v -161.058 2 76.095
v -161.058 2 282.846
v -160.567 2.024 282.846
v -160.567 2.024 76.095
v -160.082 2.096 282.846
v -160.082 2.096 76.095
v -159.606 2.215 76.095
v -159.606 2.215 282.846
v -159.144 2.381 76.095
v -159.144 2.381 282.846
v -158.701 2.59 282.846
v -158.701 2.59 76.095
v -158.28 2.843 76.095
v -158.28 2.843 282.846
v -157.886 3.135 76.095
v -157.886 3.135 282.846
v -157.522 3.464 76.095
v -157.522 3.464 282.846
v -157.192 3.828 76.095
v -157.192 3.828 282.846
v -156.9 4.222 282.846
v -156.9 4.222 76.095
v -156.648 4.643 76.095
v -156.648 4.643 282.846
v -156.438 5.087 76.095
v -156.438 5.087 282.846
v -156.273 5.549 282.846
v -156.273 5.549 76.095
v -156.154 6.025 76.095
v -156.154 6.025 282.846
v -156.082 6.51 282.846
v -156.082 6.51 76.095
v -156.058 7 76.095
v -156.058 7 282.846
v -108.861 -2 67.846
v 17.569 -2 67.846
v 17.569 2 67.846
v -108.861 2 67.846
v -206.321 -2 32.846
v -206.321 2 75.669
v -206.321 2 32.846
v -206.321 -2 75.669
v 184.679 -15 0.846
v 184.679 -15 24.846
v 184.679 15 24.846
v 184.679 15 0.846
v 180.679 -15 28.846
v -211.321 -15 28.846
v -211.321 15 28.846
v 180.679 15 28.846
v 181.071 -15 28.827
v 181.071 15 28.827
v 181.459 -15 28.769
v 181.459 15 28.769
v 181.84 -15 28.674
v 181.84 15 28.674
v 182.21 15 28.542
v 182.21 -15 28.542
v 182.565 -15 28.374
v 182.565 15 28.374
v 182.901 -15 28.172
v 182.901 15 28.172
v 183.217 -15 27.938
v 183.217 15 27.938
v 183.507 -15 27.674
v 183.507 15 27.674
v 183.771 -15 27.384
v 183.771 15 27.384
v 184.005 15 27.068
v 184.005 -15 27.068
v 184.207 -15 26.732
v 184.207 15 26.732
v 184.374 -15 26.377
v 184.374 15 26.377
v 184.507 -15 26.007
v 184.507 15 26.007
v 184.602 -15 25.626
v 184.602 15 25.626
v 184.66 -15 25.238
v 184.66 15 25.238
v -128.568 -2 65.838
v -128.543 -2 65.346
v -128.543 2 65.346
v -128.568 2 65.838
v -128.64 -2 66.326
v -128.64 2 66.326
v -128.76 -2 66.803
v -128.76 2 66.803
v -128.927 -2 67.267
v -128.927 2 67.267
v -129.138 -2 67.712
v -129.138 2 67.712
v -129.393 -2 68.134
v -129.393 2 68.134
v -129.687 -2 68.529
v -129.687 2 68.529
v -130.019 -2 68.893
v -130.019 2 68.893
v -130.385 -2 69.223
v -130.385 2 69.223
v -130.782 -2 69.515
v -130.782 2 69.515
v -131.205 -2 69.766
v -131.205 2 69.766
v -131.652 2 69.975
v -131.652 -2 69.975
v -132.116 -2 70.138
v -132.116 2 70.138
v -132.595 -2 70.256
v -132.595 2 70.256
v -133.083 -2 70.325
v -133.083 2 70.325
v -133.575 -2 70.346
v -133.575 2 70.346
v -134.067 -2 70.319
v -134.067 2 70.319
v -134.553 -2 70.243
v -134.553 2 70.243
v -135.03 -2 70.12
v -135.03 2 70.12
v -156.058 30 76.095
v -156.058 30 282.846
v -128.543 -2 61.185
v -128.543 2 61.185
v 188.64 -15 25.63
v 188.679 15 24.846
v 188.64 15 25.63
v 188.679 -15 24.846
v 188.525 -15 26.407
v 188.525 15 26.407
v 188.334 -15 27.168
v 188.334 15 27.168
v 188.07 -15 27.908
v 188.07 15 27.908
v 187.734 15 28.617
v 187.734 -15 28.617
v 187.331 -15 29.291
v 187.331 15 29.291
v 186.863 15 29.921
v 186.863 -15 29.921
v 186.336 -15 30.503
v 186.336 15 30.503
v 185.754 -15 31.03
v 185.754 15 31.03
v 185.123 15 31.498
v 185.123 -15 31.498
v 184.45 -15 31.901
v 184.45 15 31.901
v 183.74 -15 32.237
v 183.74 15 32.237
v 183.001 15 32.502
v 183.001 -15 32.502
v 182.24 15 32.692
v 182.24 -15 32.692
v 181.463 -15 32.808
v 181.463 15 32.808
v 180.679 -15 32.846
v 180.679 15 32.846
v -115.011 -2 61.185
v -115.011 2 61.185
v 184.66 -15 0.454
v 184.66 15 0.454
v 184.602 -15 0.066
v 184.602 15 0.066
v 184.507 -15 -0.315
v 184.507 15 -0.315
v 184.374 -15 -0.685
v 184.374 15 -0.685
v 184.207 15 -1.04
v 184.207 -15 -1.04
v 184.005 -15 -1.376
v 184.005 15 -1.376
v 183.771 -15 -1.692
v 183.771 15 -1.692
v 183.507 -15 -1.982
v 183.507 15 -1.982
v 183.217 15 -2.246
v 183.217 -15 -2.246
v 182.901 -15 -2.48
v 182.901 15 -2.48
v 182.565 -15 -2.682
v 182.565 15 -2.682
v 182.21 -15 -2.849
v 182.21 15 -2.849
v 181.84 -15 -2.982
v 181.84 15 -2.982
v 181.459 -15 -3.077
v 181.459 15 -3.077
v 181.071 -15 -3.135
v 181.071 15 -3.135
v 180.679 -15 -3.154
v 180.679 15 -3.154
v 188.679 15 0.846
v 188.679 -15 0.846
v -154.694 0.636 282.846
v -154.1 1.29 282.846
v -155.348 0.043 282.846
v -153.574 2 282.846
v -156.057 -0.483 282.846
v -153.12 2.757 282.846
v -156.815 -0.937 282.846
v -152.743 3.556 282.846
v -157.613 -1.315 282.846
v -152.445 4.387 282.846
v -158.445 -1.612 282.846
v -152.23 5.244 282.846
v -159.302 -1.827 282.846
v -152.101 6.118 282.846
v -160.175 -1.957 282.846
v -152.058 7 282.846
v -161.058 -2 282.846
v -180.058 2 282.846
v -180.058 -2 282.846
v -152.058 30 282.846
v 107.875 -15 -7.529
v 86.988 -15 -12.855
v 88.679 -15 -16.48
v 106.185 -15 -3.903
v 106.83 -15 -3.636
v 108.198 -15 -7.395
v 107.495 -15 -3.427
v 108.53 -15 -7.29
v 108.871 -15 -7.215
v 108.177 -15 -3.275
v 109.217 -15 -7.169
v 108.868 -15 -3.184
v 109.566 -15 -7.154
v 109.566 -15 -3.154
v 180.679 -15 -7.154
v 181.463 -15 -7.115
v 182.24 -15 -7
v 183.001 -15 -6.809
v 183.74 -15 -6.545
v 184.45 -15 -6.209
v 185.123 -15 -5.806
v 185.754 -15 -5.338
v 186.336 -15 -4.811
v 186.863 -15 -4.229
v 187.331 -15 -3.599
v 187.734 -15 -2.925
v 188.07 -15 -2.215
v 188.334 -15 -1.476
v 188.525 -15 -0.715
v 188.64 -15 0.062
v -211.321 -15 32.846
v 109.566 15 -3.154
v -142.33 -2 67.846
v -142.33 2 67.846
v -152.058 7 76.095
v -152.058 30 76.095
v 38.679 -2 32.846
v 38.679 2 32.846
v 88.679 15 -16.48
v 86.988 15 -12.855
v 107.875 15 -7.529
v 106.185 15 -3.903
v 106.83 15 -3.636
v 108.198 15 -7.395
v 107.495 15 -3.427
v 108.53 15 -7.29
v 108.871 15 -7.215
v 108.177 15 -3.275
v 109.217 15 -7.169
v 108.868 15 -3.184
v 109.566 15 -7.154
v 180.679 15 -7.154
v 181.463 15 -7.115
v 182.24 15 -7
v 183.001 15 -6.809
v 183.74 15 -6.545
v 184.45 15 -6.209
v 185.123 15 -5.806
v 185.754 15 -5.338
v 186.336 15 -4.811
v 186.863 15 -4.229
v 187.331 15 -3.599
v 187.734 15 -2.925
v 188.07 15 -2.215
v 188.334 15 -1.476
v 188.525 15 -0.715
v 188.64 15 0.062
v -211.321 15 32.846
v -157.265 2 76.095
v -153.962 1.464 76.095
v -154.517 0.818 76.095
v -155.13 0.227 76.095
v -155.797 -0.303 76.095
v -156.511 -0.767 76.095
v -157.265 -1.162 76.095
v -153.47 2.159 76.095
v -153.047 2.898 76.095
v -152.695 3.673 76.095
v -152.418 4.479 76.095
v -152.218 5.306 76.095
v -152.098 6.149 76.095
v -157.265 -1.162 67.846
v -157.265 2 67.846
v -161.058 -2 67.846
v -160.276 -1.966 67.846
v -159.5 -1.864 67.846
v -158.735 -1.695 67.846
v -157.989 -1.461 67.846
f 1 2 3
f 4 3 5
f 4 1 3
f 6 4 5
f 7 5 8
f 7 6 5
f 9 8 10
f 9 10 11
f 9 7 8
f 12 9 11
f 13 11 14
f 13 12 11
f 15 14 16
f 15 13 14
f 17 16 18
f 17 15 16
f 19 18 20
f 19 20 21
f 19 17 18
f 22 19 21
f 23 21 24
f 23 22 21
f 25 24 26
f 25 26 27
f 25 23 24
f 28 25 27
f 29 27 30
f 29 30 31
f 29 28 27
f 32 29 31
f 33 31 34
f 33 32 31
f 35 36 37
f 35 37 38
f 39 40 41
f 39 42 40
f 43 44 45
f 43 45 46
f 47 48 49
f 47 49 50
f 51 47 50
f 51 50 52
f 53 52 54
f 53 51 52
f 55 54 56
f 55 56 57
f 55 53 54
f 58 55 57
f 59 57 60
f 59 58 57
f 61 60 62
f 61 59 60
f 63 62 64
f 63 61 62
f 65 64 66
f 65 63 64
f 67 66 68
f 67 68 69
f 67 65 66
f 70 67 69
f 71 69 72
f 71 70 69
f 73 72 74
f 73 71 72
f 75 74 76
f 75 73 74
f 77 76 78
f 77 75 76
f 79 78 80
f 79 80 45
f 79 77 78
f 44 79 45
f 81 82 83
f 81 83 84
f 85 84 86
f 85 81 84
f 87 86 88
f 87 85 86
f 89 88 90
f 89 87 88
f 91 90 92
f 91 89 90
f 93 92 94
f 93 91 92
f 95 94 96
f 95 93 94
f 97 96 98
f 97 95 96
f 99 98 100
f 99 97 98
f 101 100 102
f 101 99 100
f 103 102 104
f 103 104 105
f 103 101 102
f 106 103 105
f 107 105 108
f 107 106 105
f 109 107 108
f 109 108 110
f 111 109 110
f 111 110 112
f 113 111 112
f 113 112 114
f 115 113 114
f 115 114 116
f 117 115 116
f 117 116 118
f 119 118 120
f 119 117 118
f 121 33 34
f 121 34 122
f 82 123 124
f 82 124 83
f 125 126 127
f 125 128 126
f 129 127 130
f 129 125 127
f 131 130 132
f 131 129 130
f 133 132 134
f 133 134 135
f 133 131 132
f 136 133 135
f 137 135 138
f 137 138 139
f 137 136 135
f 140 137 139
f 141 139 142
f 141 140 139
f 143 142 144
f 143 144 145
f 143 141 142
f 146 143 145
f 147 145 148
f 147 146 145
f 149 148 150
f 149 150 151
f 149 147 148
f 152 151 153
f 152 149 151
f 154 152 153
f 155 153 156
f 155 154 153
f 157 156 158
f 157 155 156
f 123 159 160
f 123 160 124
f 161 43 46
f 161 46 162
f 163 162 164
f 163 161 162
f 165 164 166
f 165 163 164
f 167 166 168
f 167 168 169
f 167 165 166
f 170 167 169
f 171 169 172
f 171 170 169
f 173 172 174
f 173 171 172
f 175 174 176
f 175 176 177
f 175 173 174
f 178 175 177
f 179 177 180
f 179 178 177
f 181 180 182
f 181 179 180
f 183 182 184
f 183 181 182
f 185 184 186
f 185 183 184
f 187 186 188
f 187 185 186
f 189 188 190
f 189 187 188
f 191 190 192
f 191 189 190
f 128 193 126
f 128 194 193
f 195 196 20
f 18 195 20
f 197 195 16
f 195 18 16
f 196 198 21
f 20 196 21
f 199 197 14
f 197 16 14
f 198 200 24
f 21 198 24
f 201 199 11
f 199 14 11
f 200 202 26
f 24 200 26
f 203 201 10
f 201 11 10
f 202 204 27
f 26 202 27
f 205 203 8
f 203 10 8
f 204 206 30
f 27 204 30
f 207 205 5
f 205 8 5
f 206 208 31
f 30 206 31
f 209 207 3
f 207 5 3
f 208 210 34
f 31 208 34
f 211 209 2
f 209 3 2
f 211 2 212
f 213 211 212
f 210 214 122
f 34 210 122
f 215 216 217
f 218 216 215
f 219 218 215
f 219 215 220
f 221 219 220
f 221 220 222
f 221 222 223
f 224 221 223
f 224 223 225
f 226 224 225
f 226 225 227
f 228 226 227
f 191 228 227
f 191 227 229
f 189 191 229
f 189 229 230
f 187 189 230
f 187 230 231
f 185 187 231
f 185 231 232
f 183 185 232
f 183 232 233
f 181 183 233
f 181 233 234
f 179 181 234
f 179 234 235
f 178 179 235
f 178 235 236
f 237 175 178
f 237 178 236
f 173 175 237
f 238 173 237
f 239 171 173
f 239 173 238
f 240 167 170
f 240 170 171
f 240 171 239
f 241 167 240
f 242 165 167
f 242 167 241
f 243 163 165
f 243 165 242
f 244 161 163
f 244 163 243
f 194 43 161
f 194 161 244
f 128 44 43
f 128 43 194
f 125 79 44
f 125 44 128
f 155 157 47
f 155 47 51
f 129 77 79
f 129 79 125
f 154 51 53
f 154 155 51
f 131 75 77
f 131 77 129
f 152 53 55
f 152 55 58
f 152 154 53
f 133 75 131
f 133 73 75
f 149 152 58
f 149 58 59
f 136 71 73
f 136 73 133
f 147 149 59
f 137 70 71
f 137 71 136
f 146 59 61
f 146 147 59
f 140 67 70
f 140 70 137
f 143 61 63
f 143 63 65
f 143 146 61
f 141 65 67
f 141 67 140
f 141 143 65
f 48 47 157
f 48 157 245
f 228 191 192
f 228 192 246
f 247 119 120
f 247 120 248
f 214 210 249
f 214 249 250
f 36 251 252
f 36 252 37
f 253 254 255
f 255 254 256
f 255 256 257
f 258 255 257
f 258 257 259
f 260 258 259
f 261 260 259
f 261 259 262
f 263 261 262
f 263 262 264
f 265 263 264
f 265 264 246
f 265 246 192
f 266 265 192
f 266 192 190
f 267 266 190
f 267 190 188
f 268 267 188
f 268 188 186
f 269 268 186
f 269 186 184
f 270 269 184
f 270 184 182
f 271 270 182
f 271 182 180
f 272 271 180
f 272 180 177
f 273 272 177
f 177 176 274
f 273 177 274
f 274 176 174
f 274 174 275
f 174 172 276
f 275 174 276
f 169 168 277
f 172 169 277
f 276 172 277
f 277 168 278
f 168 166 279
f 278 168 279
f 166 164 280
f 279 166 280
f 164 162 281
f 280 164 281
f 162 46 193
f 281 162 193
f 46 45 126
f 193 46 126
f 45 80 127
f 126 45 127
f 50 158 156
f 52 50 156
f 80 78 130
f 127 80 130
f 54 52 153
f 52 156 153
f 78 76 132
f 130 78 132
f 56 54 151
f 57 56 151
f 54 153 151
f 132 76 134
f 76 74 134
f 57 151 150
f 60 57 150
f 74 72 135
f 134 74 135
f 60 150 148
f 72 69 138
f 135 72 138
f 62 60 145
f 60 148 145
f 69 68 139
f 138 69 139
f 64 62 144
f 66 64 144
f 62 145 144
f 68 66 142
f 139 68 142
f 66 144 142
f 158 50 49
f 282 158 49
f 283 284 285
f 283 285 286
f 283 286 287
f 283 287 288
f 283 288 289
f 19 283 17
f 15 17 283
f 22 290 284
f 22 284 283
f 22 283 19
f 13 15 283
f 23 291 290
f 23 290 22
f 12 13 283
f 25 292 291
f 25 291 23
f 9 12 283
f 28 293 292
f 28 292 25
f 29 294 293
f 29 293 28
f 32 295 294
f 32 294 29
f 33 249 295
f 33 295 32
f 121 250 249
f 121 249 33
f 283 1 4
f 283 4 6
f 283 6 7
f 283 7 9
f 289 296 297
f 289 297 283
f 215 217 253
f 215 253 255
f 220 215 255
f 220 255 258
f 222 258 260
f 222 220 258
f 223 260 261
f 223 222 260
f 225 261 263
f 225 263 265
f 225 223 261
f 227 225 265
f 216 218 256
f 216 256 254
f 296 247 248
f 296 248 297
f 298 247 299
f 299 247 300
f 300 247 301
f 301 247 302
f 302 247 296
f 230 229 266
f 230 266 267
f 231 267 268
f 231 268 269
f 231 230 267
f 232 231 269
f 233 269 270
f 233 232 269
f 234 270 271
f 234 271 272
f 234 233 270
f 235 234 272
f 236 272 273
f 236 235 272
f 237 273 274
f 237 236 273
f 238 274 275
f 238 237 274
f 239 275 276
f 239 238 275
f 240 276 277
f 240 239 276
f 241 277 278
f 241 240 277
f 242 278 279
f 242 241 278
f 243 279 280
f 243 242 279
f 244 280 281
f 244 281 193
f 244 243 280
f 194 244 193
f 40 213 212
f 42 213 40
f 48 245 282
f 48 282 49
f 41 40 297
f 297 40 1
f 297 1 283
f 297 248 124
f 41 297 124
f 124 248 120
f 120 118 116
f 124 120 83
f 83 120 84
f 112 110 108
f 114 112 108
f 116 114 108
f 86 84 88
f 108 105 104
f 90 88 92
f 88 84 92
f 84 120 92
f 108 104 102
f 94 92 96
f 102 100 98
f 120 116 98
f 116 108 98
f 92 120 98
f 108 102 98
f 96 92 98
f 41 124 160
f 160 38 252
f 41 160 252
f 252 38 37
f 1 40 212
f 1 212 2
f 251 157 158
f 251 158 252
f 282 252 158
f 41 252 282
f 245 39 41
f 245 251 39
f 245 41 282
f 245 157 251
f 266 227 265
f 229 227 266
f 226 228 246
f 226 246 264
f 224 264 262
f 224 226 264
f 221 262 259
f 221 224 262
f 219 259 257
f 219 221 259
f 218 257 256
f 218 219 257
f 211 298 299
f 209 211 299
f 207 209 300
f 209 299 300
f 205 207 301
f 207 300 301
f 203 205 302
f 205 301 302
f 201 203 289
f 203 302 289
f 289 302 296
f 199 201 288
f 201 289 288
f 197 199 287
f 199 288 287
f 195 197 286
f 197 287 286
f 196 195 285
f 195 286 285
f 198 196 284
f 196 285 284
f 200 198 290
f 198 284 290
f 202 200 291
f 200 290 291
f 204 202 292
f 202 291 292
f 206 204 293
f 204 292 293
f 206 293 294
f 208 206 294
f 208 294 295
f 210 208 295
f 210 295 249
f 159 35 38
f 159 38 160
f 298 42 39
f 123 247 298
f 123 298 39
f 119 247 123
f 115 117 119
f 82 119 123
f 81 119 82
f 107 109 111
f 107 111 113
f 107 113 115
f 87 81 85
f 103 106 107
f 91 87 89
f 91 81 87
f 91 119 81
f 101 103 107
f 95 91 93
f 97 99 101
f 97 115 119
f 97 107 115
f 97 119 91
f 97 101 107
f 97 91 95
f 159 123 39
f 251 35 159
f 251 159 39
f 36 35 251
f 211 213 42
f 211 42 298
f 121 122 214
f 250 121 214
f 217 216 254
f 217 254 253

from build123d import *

# Parameters (mm, degrees)
F1_DEPTH    = 15
F3_DEPTH    = 2
F4_W        = 4
F4_H        = 28
F5_DEPTH    = 206.7509774754
F6_T1_DEPTH = 206.7509774754
F7_T4_DEPTH = 251.7509774754


# Not quite as in the source:
# - a fillet or chamfer that OpenCascade refuses, or shapes differently, is made with other operations: its cross-section is extruded or revolved along the edge and cut away or added


with BuildPart() as f1:
    # F0 (on Front) → F1 (new body, symmetric)
    with BuildSketch(Plane.XZ):
        with BuildLine():
            Line((180.6789295077, 32.8460444401), (-211.3210704923, 32.8460444401))
            Line((-211.3210704923, 32.8460444401), (-211.3210704923, 28.8460444401))
            Line((-211.3210704923, 28.8460444401), (180.6789295077, 28.8460444401))
            ThreePointArc((180.6789295077, 28.8460444401), (183.5073566325, 27.6744715648), (184.6789295077, 24.8460444401))
            Line((184.6789295077, 24.8460444401), (184.6789295077, 0.8460444401))
            ThreePointArc((184.6789295077, 0.8460444401), (183.5073566325, -1.9823826847), (180.6789295077, -3.1539555599))
            Line((180.6789295077, -3.1539555599), (109.5657081583, -3.1539555599))
            ThreePointArc((109.5657081583, -3.1539555599), (107.8341912468, -3.343587503), (106.1847620644, -3.9034932637))
            Line((106.1847620644, -3.9034932637), (86.9884564608, -12.8548775749))
            Line((86.9884564608, -12.8548775749), (88.6789295077, -16.480108723))
            Line((88.6789295077, -16.480108723), (107.8752351113, -7.5287244118))
            ThreePointArc((107.8752351113, -7.5287244118), (108.6999497026, -7.2487715315), (109.5657081583, -7.1539555599))
            Line((109.5657081583, -7.1539555599), (180.6789295077, -7.1539555599))
            ThreePointArc((180.6789295077, -7.1539555599), (186.3357837572, -4.8108098094), (188.6789295077, 0.8460444401))
            Line((188.6789295077, 0.8460444401), (188.6789295077, 24.8460444401))
            ThreePointArc((188.6789295077, 24.8460444401), (186.3357837572, 30.5028986895), (180.6789295077, 32.8460444401))
        make_face()
    extrude(amount=F1_DEPTH, both=True)

    # F2 (on Front) → F3 (join, symmetric)
    with BuildSketch(Plane.XZ):
        with BuildLine():
            Line((-206.3210704923, 75.6694748998), (-206.3210704923, 32.8460444401))
            Line((-206.3210704923, 32.8460444401), (38.6789295077, 32.8460444401))
            Line((38.6789295077, 32.8460444401), (17.569155556, 67.8460444401))
            Line((17.569155556, 67.8460444401), (-108.8612323146, 67.8460444401))
            Line((-108.8612323146, 67.8460444401), (-115.0114574584, 61.1853342652))
            Line((-115.0114574584, 61.1853342652), (-128.5433099752, 61.1853342652))
            Line((-128.5433099752, 61.1853342652), (-128.5433099752, 65.3464212941))
            ThreePointArc((-128.5433099752, 65.3464212941), (-130.579832864, 69.3735546928), (-135.0304313397, 70.1201483545))
            Line((-135.0304313397, 70.1201483545), (-142.3304080963, 67.8460444401))
            Line((-142.3304080963, 67.8460444401), (-157.2653103035, 67.8460444401))
            Line((-157.2653103035, 67.8460444401), (-157.2653103035, 76.0950669646))
            Line((-157.2653103035, 76.0950669646), (-152.0575187367, 76.0950669646))
            Line((-152.0575187367, 76.0950669646), (-152.0575187367, 282.8460444401))
            Line((-152.0575187367, 282.8460444401), (-180.0575187367, 282.8460444401))
            Line((-180.0575187367, 282.8460444401), (-206.3210704923, 75.6694748998))
        make_face()
    extrude(amount=F3_DEPTH, both=True)

    # F4 (on face) → F5 (join, through all)
    with BuildSketch(Plane.XY.offset(282.8460444401)):
        with Locations((-154.0575187367, 16)):
            Rectangle(F4_W, F4_H)
    extrude(amount=-F5_DEPTH)

    # F6: fillet of radius 5 on 1 edges, made by hand

    # F6_s2 → F6_t1 (join)
    with BuildSketch(Plane.XY.offset(76.0950669646)):
        with BuildLine():
            ThreePointArc((-161.0575187367, 2), (-157.5219848308, 3.4644660941), (-156.0575187367, 7))
            Line((-156.0575187367, 7), (-156.0575187367, 2))
            Line((-156.0575187367, 2), (-161.0575187367, 2))
        make_face()
    extrude(amount=F6_T1_DEPTH)

    # F7: fillet of radius 9 on 1 edges, made by hand


with BuildPart() as f7_tool2:
    # F7_s3 → F7_t4 (new body)
    with BuildSketch(Plane.XY.offset(53.5950669646)):
        with BuildLine():
            ThreePointArc((-161.0575187367, -2), (-154.6935577061, 0.6360389693), (-152.0575187367, 7))
            Line((-152.0575187367, 7), (-152.0575187367, -2))
            Line((-152.0575187367, -2), (-161.0575187367, -2))
        make_face()
    extrude(amount=F7_T4_DEPTH)

    split(bisect_by=Plane.XY.offset(67.8460444401), keep=Keep.TOP)


with BuildPart() as f1_1:
    add(f1.part)

    # F7_t1: cut F7_tool2
    add(f7_tool2.part, mode=Mode.SUBTRACT)


solid = f1_1.part
